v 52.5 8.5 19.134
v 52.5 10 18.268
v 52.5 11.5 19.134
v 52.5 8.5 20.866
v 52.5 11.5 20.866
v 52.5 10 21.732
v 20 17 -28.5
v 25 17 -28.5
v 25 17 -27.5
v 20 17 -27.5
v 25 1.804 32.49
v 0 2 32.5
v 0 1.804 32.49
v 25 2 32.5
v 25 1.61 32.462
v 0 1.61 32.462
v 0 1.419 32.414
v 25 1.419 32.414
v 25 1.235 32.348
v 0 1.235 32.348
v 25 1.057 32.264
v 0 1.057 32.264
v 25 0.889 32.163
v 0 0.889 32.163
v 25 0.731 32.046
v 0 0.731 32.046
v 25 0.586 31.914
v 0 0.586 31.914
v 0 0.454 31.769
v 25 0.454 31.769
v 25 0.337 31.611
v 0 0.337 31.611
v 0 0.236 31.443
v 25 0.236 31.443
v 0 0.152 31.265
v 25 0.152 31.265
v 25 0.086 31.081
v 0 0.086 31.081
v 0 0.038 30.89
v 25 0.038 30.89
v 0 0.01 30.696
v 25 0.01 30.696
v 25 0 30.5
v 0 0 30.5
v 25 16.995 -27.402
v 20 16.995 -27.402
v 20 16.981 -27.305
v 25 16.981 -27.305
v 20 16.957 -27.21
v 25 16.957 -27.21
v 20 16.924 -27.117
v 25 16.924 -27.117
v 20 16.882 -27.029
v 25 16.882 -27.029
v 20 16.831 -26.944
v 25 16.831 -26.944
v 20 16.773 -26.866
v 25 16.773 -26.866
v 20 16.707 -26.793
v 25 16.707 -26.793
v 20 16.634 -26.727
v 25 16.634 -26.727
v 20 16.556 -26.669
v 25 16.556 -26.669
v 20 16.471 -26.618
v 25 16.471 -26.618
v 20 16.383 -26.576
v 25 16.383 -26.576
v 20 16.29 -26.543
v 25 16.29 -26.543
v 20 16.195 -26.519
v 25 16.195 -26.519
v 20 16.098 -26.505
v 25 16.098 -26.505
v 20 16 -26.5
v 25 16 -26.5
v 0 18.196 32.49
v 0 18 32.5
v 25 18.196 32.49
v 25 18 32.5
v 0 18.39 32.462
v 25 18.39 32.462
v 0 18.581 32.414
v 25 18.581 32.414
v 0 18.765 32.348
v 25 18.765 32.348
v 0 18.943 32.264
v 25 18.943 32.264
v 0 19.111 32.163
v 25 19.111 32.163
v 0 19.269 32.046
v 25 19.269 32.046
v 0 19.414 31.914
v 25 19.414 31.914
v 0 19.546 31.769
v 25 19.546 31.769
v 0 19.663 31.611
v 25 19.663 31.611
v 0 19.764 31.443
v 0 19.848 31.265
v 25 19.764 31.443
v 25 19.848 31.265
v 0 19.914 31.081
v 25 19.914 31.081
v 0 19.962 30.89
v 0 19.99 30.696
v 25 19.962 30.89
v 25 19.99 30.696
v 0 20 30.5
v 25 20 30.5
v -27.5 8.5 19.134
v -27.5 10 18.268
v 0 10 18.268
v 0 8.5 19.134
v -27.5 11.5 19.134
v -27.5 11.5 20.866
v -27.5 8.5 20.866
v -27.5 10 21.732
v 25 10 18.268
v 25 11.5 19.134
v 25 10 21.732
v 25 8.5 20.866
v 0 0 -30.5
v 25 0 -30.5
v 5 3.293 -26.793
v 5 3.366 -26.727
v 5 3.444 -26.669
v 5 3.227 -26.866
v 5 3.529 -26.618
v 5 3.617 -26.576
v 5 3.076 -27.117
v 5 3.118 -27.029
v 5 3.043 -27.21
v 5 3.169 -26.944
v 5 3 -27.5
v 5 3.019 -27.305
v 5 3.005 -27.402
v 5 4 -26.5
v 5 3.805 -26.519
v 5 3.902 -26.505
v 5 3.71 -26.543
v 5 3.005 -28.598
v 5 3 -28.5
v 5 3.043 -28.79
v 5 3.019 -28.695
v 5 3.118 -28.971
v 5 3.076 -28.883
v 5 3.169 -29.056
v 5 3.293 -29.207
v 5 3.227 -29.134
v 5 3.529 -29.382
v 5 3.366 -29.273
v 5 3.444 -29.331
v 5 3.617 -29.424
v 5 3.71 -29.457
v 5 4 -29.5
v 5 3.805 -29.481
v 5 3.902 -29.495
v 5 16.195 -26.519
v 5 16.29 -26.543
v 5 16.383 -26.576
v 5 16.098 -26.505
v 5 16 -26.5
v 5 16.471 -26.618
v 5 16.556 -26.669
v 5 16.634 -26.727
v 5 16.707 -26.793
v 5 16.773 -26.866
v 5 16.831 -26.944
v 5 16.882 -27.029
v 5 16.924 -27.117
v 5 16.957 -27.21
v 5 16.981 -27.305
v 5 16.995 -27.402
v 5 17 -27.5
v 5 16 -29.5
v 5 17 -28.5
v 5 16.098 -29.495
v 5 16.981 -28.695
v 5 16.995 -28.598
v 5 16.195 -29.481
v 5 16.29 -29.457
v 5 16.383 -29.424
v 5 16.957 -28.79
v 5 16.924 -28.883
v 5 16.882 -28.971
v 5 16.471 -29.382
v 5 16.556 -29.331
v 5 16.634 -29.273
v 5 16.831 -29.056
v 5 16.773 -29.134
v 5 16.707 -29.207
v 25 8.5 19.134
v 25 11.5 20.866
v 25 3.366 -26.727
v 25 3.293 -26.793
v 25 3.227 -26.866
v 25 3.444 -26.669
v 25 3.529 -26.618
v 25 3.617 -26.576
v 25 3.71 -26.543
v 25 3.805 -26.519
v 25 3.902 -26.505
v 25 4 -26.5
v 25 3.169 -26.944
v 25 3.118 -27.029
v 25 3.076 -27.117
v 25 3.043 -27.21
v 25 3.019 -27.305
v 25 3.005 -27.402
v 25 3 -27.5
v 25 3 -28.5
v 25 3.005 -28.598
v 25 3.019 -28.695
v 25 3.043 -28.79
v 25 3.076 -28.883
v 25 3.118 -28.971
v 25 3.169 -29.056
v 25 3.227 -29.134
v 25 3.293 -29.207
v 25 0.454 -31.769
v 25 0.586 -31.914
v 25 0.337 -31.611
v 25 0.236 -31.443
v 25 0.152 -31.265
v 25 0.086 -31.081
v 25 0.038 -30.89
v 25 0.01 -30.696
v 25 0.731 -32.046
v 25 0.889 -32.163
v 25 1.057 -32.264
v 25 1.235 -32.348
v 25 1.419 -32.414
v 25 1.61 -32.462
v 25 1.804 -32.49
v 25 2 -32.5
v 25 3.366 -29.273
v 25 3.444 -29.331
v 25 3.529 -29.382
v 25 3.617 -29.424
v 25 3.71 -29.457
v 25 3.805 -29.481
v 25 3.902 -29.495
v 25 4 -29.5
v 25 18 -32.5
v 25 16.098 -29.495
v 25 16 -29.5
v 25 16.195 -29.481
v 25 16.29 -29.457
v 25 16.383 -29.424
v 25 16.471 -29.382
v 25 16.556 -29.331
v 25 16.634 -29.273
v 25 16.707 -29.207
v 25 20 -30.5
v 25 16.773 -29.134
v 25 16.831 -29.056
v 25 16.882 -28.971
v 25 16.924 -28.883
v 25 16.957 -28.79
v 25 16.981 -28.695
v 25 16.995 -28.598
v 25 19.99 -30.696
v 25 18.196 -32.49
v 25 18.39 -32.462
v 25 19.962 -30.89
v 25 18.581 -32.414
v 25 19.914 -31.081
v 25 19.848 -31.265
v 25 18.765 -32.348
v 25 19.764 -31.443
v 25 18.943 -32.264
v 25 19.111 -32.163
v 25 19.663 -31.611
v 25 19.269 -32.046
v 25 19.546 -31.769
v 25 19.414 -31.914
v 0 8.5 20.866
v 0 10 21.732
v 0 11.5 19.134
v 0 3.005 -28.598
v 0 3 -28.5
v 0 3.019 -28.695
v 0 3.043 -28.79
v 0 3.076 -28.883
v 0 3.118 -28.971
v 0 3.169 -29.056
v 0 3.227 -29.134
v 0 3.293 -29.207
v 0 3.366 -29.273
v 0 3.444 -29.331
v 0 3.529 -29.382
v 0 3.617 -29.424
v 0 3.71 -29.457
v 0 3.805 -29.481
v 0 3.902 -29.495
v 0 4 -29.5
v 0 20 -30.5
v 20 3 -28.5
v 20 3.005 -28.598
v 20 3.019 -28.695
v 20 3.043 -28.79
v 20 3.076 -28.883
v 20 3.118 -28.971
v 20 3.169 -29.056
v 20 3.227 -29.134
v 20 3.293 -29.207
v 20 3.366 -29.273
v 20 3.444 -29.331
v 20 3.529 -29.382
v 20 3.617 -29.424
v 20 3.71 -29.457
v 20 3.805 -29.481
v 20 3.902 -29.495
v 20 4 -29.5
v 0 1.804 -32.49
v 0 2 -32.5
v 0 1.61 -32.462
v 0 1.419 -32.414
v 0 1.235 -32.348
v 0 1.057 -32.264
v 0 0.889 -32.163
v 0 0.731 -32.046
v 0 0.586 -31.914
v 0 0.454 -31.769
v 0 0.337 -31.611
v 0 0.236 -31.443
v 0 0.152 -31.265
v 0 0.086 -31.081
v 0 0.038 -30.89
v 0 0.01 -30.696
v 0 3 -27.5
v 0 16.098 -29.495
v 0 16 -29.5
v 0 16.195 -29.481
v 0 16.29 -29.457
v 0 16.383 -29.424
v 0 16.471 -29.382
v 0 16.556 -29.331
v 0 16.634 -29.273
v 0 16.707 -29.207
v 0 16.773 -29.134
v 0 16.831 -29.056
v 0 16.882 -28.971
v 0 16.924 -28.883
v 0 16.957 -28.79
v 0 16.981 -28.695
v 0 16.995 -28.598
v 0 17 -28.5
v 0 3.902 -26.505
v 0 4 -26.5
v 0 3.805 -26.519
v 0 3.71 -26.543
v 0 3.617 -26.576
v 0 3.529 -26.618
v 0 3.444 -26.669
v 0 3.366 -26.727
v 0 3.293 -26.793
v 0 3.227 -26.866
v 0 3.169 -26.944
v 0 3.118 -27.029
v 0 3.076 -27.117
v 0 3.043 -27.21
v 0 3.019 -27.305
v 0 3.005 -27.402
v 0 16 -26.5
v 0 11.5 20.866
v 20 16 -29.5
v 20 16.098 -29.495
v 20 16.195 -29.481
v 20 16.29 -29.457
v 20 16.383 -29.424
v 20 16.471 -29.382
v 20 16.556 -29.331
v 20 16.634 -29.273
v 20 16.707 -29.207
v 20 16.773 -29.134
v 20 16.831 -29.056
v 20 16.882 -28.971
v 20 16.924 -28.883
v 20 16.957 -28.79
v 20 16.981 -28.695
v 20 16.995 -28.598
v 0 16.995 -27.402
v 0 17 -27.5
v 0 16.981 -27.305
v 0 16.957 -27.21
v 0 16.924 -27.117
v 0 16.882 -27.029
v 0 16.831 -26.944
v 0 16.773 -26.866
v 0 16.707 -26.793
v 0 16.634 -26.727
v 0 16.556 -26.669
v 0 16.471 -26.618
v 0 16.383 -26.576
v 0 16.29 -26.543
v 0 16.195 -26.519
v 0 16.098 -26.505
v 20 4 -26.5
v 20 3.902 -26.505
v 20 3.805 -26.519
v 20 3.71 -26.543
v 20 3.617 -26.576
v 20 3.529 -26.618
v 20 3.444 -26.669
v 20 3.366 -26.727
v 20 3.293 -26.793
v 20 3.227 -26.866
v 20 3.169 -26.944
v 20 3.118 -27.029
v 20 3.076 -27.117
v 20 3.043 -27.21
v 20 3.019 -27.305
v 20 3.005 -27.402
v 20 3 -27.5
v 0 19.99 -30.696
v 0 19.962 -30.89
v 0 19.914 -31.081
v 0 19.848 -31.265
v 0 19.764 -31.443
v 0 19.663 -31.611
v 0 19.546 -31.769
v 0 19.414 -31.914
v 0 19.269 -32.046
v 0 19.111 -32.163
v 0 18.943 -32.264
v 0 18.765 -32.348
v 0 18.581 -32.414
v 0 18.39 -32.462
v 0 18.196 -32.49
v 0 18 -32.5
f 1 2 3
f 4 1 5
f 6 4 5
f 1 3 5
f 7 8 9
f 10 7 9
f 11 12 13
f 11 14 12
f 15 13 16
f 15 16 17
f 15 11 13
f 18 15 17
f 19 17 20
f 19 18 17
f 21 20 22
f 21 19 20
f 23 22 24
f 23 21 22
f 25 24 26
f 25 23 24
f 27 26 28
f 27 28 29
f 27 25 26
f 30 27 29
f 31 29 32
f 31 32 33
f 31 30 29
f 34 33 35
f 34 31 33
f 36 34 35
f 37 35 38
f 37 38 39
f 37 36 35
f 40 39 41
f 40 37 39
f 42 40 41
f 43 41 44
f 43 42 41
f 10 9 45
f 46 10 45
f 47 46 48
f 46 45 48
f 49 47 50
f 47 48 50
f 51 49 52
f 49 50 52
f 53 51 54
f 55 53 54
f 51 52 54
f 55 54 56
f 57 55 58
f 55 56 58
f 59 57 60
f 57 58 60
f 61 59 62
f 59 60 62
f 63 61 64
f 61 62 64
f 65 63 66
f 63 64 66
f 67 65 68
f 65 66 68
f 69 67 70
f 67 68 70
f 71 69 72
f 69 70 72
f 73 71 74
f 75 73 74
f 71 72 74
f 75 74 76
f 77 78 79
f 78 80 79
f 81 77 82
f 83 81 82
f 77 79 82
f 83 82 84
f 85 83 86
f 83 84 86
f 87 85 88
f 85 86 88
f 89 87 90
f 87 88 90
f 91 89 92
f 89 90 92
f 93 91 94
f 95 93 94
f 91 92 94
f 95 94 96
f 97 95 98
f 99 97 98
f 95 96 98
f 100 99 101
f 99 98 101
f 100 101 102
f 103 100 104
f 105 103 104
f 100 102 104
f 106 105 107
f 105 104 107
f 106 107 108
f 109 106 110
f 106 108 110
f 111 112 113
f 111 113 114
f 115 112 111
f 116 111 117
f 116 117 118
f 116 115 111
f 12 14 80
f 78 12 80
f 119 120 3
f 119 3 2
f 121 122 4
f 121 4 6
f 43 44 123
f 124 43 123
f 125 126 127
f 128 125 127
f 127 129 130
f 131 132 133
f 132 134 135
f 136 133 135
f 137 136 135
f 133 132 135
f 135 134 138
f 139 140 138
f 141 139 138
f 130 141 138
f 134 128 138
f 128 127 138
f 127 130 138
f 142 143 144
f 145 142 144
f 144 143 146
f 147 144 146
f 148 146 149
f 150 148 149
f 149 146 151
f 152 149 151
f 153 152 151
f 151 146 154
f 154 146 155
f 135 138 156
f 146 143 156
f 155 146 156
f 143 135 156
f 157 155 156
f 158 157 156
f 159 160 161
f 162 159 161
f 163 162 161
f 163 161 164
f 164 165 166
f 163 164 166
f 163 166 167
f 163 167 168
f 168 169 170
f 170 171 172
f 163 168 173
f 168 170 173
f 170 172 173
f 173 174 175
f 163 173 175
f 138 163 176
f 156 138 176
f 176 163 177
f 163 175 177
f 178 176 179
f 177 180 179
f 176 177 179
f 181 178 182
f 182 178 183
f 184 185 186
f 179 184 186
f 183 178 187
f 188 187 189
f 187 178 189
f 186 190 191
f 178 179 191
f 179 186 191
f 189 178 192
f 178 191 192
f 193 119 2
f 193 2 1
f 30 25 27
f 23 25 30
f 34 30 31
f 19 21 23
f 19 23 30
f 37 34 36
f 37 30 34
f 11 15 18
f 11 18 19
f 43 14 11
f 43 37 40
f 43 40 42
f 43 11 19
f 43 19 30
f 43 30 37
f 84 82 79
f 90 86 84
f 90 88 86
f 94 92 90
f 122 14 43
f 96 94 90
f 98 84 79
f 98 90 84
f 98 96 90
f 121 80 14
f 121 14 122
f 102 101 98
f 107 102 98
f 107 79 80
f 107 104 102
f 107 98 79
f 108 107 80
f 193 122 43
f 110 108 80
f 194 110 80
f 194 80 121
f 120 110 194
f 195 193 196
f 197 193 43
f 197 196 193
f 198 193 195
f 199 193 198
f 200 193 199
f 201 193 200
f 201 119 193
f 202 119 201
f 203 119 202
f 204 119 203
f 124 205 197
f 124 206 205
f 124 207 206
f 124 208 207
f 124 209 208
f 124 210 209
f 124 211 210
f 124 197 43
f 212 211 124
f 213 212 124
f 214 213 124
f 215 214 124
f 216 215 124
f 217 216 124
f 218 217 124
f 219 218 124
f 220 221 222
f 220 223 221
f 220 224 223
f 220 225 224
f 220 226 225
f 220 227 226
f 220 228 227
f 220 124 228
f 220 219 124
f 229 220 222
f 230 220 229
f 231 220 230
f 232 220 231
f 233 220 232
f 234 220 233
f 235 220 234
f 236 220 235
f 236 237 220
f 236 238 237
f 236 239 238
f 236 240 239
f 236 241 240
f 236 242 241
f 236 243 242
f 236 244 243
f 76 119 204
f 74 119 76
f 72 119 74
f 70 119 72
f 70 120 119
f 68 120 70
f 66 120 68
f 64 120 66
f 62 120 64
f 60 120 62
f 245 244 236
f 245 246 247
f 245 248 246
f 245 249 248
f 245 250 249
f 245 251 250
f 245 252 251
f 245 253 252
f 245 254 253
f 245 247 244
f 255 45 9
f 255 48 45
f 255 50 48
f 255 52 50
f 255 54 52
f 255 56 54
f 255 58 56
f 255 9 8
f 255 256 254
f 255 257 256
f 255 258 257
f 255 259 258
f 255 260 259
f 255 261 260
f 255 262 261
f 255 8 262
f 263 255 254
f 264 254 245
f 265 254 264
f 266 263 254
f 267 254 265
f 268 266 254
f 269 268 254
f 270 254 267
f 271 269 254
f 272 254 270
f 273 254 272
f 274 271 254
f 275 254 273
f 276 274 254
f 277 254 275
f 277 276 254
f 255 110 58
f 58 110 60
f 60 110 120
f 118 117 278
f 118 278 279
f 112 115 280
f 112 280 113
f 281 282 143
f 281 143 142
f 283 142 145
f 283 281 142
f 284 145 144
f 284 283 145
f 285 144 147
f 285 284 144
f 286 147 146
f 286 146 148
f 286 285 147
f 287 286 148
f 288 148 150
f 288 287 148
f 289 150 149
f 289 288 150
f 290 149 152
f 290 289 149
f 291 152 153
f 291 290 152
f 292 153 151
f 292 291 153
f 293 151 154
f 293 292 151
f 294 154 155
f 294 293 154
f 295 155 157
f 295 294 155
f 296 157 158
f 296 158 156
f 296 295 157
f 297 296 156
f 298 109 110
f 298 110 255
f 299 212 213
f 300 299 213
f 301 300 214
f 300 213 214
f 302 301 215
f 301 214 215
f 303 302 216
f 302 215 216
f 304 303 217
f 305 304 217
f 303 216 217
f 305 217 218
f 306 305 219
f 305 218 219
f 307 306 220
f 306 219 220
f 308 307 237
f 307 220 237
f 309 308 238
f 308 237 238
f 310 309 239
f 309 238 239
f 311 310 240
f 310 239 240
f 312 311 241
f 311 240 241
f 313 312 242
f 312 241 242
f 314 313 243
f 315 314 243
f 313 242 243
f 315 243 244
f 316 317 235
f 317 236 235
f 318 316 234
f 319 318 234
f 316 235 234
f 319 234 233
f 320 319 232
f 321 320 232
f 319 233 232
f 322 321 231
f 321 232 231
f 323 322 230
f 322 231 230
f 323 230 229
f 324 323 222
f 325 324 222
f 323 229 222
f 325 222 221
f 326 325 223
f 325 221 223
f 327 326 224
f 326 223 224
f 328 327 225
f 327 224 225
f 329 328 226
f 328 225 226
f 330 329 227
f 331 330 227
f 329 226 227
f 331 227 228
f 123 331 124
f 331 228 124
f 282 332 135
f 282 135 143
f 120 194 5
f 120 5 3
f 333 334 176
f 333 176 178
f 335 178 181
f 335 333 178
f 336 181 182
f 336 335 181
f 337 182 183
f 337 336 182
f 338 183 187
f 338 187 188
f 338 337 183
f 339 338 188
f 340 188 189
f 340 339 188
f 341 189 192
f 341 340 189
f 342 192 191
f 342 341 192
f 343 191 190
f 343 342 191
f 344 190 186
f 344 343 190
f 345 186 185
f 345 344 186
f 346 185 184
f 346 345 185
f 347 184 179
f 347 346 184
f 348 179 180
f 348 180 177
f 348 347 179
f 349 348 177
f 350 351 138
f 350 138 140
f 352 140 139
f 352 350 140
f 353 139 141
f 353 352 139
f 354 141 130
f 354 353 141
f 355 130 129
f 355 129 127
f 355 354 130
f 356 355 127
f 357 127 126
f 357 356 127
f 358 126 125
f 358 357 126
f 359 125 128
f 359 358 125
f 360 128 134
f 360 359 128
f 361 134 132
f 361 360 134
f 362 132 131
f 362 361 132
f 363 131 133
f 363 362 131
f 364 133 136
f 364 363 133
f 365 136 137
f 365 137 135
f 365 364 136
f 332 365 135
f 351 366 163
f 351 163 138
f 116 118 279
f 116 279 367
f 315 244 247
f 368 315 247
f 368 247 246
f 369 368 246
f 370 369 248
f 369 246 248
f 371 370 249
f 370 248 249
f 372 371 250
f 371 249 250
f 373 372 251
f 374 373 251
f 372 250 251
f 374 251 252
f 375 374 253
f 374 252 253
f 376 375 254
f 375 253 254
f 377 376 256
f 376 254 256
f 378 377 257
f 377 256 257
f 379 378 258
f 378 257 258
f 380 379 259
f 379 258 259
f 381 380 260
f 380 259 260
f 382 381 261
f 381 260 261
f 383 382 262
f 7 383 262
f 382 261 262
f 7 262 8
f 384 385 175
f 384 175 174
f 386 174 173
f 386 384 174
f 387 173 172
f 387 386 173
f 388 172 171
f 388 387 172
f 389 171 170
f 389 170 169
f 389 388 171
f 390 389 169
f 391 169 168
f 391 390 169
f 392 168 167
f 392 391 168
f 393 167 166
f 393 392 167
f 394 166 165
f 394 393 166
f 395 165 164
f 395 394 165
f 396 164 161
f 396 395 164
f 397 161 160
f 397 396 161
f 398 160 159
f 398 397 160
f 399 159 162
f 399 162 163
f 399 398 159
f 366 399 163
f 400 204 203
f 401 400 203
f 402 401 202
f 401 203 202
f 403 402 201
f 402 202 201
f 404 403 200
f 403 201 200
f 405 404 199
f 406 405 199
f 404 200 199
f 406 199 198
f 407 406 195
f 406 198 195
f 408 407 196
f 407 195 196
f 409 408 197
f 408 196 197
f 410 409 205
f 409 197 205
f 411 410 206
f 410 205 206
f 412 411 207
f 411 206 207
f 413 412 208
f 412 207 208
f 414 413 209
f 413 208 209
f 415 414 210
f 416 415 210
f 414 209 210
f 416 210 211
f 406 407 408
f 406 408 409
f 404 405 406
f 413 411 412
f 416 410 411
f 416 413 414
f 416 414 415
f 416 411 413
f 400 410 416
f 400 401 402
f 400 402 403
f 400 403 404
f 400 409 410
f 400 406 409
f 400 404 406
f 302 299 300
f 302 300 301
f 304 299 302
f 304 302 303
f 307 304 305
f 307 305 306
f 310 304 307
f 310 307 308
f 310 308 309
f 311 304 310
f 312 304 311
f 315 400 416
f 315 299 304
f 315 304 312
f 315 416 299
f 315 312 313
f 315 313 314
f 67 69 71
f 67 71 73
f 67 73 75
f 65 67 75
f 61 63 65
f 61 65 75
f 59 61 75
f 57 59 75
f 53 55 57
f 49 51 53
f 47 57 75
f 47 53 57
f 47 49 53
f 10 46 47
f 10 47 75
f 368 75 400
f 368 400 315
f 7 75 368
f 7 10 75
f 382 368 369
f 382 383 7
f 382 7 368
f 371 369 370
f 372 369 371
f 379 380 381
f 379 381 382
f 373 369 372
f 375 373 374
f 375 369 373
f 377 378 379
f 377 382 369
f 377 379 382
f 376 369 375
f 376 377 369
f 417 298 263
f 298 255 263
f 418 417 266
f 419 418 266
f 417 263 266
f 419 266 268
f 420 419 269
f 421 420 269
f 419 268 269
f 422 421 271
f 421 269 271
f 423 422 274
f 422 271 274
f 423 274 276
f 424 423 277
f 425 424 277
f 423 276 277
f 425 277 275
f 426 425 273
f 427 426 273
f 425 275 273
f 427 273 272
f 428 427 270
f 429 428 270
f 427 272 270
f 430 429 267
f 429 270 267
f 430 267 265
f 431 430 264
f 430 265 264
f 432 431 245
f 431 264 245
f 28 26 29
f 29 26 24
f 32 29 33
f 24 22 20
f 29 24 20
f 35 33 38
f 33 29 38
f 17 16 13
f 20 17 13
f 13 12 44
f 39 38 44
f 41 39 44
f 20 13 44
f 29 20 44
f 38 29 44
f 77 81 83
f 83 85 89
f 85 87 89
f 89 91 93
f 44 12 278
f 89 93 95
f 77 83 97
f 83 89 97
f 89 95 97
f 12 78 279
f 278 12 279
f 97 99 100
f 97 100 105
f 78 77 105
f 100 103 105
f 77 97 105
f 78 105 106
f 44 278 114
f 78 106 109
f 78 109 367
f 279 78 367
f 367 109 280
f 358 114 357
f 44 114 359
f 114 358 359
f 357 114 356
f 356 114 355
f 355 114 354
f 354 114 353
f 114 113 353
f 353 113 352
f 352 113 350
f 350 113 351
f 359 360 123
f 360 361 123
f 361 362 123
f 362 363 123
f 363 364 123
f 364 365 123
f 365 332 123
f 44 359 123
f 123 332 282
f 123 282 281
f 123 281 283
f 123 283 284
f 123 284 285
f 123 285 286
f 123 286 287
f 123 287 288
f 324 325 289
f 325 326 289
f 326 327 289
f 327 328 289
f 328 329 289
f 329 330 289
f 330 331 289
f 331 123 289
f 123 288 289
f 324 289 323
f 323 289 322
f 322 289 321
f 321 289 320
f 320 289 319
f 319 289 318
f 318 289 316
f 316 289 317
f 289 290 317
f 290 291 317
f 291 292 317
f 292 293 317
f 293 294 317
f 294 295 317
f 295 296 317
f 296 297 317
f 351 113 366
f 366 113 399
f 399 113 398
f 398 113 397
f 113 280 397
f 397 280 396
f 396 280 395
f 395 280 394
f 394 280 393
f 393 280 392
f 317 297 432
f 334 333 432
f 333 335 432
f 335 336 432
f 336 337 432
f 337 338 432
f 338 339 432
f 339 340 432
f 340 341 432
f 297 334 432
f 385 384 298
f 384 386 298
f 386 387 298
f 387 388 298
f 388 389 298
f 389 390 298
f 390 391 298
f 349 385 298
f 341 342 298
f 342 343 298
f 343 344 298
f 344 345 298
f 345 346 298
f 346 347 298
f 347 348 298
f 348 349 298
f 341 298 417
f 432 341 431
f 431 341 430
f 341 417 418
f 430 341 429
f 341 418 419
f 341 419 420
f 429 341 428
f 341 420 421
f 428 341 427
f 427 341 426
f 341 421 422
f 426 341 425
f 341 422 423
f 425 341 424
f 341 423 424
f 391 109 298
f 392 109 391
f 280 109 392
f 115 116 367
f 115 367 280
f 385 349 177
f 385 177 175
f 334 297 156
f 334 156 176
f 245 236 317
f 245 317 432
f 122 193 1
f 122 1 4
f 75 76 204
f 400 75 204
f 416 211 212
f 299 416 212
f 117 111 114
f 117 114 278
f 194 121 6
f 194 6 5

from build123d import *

# Parameters (mm, degrees)
SKETCH_1_W          = 65
SKETCH_1_H          = 20
EXTRUDE_1_DEPTH     = 25
FILLET_1_R          = 2
FILLET_2_R          = 2
FILLET_3_R          = 2
FILLET_4_R          = 2
EXTRUDE_2_DEPTH     = 40
CUT_EXTRUDE_1_DEPTH = 5


with BuildPart() as part:
    # 草图1 → 凸台-拉伸1 (new body)
    with BuildSketch(Plane(origin=(0, 0, 0), x_dir=(0, 0, -1), z_dir=(1, 0, 0))):
        with Locations((0, 10)):
            Rectangle(SKETCH_1_W, SKETCH_1_H)
    extrude(amount=EXTRUDE_1_DEPTH)

    # 圆角1
    fillet_1_edges = [part.edges().sort_by_distance(p)[0] for p in [
        (12.5, 20, 32.5),
    ]]
    fillet(fillet_1_edges, radius=FILLET_1_R)

    # 圆角2
    fillet_2_edges = [part.edges().sort_by_distance(p)[0] for p in [
        (12.5, 0, 32.5),
    ]]
    fillet(fillet_2_edges, radius=FILLET_2_R)

    # 圆角3
    fillet_3_edges = [part.edges().sort_by_distance(p)[0] for p in [
        (12.5, 20, -32.5),
    ]]
    fillet(fillet_3_edges, radius=FILLET_3_R)

    # 圆角4
    fillet_4_edges = [part.edges().sort_by_distance(p)[0] for p in [
        (12.5, 0, -32.5),
    ]]
    fillet(fillet_4_edges, radius=FILLET_4_R)

    # 草图3 → 凸台-拉伸2 (add, symmetric)
    with BuildSketch(Plane.ZY.offset(-12.5)):
        Polygon((18.267949192, 10), (19.133974596, 8.5), (20.866025404, 8.5), (21.732050808, 10), (20.866025404, 11.5), (19.133974596, 11.5), align=None)
    extrude(amount=EXTRUDE_2_DEPTH, both=True)

    # 草图4 → 切除-拉伸1 (cut)
    with BuildSketch(Plane.ZY.offset(-25)):
        with BuildLine():
            Line((-29.5, 4), (-29.5, 16))
            ThreePointArc((-29.5, 16), (-29.207106781, 16.707106781), (-28.5, 17))
            Line((-28.5, 17), (-27.5, 17))
            ThreePointArc((-27.5, 17), (-26.792893219, 16.707106781), (-26.5, 16))
            Line((-26.5, 16), (-26.5, 4))
            ThreePointArc((-26.5, 4), (-26.792893219, 3.292893219), (-27.5, 3))
            Line((-27.5, 3), (-28.5, 3))
            ThreePointArc((-28.5, 3), (-29.207106781, 3.292893219), (-29.5, 4))
        make_face()
    cut_extrude_1 = extrude(amount=CUT_EXTRUDE_1_DEPTH, mode=Mode.SUBTRACT)

    # 镜向1: 切除-拉伸1 across plane
    add(cut_extrude_1.mirror(Plane.ZY.offset(-12.5)), mode=Mode.SUBTRACT)


solid = part.part
